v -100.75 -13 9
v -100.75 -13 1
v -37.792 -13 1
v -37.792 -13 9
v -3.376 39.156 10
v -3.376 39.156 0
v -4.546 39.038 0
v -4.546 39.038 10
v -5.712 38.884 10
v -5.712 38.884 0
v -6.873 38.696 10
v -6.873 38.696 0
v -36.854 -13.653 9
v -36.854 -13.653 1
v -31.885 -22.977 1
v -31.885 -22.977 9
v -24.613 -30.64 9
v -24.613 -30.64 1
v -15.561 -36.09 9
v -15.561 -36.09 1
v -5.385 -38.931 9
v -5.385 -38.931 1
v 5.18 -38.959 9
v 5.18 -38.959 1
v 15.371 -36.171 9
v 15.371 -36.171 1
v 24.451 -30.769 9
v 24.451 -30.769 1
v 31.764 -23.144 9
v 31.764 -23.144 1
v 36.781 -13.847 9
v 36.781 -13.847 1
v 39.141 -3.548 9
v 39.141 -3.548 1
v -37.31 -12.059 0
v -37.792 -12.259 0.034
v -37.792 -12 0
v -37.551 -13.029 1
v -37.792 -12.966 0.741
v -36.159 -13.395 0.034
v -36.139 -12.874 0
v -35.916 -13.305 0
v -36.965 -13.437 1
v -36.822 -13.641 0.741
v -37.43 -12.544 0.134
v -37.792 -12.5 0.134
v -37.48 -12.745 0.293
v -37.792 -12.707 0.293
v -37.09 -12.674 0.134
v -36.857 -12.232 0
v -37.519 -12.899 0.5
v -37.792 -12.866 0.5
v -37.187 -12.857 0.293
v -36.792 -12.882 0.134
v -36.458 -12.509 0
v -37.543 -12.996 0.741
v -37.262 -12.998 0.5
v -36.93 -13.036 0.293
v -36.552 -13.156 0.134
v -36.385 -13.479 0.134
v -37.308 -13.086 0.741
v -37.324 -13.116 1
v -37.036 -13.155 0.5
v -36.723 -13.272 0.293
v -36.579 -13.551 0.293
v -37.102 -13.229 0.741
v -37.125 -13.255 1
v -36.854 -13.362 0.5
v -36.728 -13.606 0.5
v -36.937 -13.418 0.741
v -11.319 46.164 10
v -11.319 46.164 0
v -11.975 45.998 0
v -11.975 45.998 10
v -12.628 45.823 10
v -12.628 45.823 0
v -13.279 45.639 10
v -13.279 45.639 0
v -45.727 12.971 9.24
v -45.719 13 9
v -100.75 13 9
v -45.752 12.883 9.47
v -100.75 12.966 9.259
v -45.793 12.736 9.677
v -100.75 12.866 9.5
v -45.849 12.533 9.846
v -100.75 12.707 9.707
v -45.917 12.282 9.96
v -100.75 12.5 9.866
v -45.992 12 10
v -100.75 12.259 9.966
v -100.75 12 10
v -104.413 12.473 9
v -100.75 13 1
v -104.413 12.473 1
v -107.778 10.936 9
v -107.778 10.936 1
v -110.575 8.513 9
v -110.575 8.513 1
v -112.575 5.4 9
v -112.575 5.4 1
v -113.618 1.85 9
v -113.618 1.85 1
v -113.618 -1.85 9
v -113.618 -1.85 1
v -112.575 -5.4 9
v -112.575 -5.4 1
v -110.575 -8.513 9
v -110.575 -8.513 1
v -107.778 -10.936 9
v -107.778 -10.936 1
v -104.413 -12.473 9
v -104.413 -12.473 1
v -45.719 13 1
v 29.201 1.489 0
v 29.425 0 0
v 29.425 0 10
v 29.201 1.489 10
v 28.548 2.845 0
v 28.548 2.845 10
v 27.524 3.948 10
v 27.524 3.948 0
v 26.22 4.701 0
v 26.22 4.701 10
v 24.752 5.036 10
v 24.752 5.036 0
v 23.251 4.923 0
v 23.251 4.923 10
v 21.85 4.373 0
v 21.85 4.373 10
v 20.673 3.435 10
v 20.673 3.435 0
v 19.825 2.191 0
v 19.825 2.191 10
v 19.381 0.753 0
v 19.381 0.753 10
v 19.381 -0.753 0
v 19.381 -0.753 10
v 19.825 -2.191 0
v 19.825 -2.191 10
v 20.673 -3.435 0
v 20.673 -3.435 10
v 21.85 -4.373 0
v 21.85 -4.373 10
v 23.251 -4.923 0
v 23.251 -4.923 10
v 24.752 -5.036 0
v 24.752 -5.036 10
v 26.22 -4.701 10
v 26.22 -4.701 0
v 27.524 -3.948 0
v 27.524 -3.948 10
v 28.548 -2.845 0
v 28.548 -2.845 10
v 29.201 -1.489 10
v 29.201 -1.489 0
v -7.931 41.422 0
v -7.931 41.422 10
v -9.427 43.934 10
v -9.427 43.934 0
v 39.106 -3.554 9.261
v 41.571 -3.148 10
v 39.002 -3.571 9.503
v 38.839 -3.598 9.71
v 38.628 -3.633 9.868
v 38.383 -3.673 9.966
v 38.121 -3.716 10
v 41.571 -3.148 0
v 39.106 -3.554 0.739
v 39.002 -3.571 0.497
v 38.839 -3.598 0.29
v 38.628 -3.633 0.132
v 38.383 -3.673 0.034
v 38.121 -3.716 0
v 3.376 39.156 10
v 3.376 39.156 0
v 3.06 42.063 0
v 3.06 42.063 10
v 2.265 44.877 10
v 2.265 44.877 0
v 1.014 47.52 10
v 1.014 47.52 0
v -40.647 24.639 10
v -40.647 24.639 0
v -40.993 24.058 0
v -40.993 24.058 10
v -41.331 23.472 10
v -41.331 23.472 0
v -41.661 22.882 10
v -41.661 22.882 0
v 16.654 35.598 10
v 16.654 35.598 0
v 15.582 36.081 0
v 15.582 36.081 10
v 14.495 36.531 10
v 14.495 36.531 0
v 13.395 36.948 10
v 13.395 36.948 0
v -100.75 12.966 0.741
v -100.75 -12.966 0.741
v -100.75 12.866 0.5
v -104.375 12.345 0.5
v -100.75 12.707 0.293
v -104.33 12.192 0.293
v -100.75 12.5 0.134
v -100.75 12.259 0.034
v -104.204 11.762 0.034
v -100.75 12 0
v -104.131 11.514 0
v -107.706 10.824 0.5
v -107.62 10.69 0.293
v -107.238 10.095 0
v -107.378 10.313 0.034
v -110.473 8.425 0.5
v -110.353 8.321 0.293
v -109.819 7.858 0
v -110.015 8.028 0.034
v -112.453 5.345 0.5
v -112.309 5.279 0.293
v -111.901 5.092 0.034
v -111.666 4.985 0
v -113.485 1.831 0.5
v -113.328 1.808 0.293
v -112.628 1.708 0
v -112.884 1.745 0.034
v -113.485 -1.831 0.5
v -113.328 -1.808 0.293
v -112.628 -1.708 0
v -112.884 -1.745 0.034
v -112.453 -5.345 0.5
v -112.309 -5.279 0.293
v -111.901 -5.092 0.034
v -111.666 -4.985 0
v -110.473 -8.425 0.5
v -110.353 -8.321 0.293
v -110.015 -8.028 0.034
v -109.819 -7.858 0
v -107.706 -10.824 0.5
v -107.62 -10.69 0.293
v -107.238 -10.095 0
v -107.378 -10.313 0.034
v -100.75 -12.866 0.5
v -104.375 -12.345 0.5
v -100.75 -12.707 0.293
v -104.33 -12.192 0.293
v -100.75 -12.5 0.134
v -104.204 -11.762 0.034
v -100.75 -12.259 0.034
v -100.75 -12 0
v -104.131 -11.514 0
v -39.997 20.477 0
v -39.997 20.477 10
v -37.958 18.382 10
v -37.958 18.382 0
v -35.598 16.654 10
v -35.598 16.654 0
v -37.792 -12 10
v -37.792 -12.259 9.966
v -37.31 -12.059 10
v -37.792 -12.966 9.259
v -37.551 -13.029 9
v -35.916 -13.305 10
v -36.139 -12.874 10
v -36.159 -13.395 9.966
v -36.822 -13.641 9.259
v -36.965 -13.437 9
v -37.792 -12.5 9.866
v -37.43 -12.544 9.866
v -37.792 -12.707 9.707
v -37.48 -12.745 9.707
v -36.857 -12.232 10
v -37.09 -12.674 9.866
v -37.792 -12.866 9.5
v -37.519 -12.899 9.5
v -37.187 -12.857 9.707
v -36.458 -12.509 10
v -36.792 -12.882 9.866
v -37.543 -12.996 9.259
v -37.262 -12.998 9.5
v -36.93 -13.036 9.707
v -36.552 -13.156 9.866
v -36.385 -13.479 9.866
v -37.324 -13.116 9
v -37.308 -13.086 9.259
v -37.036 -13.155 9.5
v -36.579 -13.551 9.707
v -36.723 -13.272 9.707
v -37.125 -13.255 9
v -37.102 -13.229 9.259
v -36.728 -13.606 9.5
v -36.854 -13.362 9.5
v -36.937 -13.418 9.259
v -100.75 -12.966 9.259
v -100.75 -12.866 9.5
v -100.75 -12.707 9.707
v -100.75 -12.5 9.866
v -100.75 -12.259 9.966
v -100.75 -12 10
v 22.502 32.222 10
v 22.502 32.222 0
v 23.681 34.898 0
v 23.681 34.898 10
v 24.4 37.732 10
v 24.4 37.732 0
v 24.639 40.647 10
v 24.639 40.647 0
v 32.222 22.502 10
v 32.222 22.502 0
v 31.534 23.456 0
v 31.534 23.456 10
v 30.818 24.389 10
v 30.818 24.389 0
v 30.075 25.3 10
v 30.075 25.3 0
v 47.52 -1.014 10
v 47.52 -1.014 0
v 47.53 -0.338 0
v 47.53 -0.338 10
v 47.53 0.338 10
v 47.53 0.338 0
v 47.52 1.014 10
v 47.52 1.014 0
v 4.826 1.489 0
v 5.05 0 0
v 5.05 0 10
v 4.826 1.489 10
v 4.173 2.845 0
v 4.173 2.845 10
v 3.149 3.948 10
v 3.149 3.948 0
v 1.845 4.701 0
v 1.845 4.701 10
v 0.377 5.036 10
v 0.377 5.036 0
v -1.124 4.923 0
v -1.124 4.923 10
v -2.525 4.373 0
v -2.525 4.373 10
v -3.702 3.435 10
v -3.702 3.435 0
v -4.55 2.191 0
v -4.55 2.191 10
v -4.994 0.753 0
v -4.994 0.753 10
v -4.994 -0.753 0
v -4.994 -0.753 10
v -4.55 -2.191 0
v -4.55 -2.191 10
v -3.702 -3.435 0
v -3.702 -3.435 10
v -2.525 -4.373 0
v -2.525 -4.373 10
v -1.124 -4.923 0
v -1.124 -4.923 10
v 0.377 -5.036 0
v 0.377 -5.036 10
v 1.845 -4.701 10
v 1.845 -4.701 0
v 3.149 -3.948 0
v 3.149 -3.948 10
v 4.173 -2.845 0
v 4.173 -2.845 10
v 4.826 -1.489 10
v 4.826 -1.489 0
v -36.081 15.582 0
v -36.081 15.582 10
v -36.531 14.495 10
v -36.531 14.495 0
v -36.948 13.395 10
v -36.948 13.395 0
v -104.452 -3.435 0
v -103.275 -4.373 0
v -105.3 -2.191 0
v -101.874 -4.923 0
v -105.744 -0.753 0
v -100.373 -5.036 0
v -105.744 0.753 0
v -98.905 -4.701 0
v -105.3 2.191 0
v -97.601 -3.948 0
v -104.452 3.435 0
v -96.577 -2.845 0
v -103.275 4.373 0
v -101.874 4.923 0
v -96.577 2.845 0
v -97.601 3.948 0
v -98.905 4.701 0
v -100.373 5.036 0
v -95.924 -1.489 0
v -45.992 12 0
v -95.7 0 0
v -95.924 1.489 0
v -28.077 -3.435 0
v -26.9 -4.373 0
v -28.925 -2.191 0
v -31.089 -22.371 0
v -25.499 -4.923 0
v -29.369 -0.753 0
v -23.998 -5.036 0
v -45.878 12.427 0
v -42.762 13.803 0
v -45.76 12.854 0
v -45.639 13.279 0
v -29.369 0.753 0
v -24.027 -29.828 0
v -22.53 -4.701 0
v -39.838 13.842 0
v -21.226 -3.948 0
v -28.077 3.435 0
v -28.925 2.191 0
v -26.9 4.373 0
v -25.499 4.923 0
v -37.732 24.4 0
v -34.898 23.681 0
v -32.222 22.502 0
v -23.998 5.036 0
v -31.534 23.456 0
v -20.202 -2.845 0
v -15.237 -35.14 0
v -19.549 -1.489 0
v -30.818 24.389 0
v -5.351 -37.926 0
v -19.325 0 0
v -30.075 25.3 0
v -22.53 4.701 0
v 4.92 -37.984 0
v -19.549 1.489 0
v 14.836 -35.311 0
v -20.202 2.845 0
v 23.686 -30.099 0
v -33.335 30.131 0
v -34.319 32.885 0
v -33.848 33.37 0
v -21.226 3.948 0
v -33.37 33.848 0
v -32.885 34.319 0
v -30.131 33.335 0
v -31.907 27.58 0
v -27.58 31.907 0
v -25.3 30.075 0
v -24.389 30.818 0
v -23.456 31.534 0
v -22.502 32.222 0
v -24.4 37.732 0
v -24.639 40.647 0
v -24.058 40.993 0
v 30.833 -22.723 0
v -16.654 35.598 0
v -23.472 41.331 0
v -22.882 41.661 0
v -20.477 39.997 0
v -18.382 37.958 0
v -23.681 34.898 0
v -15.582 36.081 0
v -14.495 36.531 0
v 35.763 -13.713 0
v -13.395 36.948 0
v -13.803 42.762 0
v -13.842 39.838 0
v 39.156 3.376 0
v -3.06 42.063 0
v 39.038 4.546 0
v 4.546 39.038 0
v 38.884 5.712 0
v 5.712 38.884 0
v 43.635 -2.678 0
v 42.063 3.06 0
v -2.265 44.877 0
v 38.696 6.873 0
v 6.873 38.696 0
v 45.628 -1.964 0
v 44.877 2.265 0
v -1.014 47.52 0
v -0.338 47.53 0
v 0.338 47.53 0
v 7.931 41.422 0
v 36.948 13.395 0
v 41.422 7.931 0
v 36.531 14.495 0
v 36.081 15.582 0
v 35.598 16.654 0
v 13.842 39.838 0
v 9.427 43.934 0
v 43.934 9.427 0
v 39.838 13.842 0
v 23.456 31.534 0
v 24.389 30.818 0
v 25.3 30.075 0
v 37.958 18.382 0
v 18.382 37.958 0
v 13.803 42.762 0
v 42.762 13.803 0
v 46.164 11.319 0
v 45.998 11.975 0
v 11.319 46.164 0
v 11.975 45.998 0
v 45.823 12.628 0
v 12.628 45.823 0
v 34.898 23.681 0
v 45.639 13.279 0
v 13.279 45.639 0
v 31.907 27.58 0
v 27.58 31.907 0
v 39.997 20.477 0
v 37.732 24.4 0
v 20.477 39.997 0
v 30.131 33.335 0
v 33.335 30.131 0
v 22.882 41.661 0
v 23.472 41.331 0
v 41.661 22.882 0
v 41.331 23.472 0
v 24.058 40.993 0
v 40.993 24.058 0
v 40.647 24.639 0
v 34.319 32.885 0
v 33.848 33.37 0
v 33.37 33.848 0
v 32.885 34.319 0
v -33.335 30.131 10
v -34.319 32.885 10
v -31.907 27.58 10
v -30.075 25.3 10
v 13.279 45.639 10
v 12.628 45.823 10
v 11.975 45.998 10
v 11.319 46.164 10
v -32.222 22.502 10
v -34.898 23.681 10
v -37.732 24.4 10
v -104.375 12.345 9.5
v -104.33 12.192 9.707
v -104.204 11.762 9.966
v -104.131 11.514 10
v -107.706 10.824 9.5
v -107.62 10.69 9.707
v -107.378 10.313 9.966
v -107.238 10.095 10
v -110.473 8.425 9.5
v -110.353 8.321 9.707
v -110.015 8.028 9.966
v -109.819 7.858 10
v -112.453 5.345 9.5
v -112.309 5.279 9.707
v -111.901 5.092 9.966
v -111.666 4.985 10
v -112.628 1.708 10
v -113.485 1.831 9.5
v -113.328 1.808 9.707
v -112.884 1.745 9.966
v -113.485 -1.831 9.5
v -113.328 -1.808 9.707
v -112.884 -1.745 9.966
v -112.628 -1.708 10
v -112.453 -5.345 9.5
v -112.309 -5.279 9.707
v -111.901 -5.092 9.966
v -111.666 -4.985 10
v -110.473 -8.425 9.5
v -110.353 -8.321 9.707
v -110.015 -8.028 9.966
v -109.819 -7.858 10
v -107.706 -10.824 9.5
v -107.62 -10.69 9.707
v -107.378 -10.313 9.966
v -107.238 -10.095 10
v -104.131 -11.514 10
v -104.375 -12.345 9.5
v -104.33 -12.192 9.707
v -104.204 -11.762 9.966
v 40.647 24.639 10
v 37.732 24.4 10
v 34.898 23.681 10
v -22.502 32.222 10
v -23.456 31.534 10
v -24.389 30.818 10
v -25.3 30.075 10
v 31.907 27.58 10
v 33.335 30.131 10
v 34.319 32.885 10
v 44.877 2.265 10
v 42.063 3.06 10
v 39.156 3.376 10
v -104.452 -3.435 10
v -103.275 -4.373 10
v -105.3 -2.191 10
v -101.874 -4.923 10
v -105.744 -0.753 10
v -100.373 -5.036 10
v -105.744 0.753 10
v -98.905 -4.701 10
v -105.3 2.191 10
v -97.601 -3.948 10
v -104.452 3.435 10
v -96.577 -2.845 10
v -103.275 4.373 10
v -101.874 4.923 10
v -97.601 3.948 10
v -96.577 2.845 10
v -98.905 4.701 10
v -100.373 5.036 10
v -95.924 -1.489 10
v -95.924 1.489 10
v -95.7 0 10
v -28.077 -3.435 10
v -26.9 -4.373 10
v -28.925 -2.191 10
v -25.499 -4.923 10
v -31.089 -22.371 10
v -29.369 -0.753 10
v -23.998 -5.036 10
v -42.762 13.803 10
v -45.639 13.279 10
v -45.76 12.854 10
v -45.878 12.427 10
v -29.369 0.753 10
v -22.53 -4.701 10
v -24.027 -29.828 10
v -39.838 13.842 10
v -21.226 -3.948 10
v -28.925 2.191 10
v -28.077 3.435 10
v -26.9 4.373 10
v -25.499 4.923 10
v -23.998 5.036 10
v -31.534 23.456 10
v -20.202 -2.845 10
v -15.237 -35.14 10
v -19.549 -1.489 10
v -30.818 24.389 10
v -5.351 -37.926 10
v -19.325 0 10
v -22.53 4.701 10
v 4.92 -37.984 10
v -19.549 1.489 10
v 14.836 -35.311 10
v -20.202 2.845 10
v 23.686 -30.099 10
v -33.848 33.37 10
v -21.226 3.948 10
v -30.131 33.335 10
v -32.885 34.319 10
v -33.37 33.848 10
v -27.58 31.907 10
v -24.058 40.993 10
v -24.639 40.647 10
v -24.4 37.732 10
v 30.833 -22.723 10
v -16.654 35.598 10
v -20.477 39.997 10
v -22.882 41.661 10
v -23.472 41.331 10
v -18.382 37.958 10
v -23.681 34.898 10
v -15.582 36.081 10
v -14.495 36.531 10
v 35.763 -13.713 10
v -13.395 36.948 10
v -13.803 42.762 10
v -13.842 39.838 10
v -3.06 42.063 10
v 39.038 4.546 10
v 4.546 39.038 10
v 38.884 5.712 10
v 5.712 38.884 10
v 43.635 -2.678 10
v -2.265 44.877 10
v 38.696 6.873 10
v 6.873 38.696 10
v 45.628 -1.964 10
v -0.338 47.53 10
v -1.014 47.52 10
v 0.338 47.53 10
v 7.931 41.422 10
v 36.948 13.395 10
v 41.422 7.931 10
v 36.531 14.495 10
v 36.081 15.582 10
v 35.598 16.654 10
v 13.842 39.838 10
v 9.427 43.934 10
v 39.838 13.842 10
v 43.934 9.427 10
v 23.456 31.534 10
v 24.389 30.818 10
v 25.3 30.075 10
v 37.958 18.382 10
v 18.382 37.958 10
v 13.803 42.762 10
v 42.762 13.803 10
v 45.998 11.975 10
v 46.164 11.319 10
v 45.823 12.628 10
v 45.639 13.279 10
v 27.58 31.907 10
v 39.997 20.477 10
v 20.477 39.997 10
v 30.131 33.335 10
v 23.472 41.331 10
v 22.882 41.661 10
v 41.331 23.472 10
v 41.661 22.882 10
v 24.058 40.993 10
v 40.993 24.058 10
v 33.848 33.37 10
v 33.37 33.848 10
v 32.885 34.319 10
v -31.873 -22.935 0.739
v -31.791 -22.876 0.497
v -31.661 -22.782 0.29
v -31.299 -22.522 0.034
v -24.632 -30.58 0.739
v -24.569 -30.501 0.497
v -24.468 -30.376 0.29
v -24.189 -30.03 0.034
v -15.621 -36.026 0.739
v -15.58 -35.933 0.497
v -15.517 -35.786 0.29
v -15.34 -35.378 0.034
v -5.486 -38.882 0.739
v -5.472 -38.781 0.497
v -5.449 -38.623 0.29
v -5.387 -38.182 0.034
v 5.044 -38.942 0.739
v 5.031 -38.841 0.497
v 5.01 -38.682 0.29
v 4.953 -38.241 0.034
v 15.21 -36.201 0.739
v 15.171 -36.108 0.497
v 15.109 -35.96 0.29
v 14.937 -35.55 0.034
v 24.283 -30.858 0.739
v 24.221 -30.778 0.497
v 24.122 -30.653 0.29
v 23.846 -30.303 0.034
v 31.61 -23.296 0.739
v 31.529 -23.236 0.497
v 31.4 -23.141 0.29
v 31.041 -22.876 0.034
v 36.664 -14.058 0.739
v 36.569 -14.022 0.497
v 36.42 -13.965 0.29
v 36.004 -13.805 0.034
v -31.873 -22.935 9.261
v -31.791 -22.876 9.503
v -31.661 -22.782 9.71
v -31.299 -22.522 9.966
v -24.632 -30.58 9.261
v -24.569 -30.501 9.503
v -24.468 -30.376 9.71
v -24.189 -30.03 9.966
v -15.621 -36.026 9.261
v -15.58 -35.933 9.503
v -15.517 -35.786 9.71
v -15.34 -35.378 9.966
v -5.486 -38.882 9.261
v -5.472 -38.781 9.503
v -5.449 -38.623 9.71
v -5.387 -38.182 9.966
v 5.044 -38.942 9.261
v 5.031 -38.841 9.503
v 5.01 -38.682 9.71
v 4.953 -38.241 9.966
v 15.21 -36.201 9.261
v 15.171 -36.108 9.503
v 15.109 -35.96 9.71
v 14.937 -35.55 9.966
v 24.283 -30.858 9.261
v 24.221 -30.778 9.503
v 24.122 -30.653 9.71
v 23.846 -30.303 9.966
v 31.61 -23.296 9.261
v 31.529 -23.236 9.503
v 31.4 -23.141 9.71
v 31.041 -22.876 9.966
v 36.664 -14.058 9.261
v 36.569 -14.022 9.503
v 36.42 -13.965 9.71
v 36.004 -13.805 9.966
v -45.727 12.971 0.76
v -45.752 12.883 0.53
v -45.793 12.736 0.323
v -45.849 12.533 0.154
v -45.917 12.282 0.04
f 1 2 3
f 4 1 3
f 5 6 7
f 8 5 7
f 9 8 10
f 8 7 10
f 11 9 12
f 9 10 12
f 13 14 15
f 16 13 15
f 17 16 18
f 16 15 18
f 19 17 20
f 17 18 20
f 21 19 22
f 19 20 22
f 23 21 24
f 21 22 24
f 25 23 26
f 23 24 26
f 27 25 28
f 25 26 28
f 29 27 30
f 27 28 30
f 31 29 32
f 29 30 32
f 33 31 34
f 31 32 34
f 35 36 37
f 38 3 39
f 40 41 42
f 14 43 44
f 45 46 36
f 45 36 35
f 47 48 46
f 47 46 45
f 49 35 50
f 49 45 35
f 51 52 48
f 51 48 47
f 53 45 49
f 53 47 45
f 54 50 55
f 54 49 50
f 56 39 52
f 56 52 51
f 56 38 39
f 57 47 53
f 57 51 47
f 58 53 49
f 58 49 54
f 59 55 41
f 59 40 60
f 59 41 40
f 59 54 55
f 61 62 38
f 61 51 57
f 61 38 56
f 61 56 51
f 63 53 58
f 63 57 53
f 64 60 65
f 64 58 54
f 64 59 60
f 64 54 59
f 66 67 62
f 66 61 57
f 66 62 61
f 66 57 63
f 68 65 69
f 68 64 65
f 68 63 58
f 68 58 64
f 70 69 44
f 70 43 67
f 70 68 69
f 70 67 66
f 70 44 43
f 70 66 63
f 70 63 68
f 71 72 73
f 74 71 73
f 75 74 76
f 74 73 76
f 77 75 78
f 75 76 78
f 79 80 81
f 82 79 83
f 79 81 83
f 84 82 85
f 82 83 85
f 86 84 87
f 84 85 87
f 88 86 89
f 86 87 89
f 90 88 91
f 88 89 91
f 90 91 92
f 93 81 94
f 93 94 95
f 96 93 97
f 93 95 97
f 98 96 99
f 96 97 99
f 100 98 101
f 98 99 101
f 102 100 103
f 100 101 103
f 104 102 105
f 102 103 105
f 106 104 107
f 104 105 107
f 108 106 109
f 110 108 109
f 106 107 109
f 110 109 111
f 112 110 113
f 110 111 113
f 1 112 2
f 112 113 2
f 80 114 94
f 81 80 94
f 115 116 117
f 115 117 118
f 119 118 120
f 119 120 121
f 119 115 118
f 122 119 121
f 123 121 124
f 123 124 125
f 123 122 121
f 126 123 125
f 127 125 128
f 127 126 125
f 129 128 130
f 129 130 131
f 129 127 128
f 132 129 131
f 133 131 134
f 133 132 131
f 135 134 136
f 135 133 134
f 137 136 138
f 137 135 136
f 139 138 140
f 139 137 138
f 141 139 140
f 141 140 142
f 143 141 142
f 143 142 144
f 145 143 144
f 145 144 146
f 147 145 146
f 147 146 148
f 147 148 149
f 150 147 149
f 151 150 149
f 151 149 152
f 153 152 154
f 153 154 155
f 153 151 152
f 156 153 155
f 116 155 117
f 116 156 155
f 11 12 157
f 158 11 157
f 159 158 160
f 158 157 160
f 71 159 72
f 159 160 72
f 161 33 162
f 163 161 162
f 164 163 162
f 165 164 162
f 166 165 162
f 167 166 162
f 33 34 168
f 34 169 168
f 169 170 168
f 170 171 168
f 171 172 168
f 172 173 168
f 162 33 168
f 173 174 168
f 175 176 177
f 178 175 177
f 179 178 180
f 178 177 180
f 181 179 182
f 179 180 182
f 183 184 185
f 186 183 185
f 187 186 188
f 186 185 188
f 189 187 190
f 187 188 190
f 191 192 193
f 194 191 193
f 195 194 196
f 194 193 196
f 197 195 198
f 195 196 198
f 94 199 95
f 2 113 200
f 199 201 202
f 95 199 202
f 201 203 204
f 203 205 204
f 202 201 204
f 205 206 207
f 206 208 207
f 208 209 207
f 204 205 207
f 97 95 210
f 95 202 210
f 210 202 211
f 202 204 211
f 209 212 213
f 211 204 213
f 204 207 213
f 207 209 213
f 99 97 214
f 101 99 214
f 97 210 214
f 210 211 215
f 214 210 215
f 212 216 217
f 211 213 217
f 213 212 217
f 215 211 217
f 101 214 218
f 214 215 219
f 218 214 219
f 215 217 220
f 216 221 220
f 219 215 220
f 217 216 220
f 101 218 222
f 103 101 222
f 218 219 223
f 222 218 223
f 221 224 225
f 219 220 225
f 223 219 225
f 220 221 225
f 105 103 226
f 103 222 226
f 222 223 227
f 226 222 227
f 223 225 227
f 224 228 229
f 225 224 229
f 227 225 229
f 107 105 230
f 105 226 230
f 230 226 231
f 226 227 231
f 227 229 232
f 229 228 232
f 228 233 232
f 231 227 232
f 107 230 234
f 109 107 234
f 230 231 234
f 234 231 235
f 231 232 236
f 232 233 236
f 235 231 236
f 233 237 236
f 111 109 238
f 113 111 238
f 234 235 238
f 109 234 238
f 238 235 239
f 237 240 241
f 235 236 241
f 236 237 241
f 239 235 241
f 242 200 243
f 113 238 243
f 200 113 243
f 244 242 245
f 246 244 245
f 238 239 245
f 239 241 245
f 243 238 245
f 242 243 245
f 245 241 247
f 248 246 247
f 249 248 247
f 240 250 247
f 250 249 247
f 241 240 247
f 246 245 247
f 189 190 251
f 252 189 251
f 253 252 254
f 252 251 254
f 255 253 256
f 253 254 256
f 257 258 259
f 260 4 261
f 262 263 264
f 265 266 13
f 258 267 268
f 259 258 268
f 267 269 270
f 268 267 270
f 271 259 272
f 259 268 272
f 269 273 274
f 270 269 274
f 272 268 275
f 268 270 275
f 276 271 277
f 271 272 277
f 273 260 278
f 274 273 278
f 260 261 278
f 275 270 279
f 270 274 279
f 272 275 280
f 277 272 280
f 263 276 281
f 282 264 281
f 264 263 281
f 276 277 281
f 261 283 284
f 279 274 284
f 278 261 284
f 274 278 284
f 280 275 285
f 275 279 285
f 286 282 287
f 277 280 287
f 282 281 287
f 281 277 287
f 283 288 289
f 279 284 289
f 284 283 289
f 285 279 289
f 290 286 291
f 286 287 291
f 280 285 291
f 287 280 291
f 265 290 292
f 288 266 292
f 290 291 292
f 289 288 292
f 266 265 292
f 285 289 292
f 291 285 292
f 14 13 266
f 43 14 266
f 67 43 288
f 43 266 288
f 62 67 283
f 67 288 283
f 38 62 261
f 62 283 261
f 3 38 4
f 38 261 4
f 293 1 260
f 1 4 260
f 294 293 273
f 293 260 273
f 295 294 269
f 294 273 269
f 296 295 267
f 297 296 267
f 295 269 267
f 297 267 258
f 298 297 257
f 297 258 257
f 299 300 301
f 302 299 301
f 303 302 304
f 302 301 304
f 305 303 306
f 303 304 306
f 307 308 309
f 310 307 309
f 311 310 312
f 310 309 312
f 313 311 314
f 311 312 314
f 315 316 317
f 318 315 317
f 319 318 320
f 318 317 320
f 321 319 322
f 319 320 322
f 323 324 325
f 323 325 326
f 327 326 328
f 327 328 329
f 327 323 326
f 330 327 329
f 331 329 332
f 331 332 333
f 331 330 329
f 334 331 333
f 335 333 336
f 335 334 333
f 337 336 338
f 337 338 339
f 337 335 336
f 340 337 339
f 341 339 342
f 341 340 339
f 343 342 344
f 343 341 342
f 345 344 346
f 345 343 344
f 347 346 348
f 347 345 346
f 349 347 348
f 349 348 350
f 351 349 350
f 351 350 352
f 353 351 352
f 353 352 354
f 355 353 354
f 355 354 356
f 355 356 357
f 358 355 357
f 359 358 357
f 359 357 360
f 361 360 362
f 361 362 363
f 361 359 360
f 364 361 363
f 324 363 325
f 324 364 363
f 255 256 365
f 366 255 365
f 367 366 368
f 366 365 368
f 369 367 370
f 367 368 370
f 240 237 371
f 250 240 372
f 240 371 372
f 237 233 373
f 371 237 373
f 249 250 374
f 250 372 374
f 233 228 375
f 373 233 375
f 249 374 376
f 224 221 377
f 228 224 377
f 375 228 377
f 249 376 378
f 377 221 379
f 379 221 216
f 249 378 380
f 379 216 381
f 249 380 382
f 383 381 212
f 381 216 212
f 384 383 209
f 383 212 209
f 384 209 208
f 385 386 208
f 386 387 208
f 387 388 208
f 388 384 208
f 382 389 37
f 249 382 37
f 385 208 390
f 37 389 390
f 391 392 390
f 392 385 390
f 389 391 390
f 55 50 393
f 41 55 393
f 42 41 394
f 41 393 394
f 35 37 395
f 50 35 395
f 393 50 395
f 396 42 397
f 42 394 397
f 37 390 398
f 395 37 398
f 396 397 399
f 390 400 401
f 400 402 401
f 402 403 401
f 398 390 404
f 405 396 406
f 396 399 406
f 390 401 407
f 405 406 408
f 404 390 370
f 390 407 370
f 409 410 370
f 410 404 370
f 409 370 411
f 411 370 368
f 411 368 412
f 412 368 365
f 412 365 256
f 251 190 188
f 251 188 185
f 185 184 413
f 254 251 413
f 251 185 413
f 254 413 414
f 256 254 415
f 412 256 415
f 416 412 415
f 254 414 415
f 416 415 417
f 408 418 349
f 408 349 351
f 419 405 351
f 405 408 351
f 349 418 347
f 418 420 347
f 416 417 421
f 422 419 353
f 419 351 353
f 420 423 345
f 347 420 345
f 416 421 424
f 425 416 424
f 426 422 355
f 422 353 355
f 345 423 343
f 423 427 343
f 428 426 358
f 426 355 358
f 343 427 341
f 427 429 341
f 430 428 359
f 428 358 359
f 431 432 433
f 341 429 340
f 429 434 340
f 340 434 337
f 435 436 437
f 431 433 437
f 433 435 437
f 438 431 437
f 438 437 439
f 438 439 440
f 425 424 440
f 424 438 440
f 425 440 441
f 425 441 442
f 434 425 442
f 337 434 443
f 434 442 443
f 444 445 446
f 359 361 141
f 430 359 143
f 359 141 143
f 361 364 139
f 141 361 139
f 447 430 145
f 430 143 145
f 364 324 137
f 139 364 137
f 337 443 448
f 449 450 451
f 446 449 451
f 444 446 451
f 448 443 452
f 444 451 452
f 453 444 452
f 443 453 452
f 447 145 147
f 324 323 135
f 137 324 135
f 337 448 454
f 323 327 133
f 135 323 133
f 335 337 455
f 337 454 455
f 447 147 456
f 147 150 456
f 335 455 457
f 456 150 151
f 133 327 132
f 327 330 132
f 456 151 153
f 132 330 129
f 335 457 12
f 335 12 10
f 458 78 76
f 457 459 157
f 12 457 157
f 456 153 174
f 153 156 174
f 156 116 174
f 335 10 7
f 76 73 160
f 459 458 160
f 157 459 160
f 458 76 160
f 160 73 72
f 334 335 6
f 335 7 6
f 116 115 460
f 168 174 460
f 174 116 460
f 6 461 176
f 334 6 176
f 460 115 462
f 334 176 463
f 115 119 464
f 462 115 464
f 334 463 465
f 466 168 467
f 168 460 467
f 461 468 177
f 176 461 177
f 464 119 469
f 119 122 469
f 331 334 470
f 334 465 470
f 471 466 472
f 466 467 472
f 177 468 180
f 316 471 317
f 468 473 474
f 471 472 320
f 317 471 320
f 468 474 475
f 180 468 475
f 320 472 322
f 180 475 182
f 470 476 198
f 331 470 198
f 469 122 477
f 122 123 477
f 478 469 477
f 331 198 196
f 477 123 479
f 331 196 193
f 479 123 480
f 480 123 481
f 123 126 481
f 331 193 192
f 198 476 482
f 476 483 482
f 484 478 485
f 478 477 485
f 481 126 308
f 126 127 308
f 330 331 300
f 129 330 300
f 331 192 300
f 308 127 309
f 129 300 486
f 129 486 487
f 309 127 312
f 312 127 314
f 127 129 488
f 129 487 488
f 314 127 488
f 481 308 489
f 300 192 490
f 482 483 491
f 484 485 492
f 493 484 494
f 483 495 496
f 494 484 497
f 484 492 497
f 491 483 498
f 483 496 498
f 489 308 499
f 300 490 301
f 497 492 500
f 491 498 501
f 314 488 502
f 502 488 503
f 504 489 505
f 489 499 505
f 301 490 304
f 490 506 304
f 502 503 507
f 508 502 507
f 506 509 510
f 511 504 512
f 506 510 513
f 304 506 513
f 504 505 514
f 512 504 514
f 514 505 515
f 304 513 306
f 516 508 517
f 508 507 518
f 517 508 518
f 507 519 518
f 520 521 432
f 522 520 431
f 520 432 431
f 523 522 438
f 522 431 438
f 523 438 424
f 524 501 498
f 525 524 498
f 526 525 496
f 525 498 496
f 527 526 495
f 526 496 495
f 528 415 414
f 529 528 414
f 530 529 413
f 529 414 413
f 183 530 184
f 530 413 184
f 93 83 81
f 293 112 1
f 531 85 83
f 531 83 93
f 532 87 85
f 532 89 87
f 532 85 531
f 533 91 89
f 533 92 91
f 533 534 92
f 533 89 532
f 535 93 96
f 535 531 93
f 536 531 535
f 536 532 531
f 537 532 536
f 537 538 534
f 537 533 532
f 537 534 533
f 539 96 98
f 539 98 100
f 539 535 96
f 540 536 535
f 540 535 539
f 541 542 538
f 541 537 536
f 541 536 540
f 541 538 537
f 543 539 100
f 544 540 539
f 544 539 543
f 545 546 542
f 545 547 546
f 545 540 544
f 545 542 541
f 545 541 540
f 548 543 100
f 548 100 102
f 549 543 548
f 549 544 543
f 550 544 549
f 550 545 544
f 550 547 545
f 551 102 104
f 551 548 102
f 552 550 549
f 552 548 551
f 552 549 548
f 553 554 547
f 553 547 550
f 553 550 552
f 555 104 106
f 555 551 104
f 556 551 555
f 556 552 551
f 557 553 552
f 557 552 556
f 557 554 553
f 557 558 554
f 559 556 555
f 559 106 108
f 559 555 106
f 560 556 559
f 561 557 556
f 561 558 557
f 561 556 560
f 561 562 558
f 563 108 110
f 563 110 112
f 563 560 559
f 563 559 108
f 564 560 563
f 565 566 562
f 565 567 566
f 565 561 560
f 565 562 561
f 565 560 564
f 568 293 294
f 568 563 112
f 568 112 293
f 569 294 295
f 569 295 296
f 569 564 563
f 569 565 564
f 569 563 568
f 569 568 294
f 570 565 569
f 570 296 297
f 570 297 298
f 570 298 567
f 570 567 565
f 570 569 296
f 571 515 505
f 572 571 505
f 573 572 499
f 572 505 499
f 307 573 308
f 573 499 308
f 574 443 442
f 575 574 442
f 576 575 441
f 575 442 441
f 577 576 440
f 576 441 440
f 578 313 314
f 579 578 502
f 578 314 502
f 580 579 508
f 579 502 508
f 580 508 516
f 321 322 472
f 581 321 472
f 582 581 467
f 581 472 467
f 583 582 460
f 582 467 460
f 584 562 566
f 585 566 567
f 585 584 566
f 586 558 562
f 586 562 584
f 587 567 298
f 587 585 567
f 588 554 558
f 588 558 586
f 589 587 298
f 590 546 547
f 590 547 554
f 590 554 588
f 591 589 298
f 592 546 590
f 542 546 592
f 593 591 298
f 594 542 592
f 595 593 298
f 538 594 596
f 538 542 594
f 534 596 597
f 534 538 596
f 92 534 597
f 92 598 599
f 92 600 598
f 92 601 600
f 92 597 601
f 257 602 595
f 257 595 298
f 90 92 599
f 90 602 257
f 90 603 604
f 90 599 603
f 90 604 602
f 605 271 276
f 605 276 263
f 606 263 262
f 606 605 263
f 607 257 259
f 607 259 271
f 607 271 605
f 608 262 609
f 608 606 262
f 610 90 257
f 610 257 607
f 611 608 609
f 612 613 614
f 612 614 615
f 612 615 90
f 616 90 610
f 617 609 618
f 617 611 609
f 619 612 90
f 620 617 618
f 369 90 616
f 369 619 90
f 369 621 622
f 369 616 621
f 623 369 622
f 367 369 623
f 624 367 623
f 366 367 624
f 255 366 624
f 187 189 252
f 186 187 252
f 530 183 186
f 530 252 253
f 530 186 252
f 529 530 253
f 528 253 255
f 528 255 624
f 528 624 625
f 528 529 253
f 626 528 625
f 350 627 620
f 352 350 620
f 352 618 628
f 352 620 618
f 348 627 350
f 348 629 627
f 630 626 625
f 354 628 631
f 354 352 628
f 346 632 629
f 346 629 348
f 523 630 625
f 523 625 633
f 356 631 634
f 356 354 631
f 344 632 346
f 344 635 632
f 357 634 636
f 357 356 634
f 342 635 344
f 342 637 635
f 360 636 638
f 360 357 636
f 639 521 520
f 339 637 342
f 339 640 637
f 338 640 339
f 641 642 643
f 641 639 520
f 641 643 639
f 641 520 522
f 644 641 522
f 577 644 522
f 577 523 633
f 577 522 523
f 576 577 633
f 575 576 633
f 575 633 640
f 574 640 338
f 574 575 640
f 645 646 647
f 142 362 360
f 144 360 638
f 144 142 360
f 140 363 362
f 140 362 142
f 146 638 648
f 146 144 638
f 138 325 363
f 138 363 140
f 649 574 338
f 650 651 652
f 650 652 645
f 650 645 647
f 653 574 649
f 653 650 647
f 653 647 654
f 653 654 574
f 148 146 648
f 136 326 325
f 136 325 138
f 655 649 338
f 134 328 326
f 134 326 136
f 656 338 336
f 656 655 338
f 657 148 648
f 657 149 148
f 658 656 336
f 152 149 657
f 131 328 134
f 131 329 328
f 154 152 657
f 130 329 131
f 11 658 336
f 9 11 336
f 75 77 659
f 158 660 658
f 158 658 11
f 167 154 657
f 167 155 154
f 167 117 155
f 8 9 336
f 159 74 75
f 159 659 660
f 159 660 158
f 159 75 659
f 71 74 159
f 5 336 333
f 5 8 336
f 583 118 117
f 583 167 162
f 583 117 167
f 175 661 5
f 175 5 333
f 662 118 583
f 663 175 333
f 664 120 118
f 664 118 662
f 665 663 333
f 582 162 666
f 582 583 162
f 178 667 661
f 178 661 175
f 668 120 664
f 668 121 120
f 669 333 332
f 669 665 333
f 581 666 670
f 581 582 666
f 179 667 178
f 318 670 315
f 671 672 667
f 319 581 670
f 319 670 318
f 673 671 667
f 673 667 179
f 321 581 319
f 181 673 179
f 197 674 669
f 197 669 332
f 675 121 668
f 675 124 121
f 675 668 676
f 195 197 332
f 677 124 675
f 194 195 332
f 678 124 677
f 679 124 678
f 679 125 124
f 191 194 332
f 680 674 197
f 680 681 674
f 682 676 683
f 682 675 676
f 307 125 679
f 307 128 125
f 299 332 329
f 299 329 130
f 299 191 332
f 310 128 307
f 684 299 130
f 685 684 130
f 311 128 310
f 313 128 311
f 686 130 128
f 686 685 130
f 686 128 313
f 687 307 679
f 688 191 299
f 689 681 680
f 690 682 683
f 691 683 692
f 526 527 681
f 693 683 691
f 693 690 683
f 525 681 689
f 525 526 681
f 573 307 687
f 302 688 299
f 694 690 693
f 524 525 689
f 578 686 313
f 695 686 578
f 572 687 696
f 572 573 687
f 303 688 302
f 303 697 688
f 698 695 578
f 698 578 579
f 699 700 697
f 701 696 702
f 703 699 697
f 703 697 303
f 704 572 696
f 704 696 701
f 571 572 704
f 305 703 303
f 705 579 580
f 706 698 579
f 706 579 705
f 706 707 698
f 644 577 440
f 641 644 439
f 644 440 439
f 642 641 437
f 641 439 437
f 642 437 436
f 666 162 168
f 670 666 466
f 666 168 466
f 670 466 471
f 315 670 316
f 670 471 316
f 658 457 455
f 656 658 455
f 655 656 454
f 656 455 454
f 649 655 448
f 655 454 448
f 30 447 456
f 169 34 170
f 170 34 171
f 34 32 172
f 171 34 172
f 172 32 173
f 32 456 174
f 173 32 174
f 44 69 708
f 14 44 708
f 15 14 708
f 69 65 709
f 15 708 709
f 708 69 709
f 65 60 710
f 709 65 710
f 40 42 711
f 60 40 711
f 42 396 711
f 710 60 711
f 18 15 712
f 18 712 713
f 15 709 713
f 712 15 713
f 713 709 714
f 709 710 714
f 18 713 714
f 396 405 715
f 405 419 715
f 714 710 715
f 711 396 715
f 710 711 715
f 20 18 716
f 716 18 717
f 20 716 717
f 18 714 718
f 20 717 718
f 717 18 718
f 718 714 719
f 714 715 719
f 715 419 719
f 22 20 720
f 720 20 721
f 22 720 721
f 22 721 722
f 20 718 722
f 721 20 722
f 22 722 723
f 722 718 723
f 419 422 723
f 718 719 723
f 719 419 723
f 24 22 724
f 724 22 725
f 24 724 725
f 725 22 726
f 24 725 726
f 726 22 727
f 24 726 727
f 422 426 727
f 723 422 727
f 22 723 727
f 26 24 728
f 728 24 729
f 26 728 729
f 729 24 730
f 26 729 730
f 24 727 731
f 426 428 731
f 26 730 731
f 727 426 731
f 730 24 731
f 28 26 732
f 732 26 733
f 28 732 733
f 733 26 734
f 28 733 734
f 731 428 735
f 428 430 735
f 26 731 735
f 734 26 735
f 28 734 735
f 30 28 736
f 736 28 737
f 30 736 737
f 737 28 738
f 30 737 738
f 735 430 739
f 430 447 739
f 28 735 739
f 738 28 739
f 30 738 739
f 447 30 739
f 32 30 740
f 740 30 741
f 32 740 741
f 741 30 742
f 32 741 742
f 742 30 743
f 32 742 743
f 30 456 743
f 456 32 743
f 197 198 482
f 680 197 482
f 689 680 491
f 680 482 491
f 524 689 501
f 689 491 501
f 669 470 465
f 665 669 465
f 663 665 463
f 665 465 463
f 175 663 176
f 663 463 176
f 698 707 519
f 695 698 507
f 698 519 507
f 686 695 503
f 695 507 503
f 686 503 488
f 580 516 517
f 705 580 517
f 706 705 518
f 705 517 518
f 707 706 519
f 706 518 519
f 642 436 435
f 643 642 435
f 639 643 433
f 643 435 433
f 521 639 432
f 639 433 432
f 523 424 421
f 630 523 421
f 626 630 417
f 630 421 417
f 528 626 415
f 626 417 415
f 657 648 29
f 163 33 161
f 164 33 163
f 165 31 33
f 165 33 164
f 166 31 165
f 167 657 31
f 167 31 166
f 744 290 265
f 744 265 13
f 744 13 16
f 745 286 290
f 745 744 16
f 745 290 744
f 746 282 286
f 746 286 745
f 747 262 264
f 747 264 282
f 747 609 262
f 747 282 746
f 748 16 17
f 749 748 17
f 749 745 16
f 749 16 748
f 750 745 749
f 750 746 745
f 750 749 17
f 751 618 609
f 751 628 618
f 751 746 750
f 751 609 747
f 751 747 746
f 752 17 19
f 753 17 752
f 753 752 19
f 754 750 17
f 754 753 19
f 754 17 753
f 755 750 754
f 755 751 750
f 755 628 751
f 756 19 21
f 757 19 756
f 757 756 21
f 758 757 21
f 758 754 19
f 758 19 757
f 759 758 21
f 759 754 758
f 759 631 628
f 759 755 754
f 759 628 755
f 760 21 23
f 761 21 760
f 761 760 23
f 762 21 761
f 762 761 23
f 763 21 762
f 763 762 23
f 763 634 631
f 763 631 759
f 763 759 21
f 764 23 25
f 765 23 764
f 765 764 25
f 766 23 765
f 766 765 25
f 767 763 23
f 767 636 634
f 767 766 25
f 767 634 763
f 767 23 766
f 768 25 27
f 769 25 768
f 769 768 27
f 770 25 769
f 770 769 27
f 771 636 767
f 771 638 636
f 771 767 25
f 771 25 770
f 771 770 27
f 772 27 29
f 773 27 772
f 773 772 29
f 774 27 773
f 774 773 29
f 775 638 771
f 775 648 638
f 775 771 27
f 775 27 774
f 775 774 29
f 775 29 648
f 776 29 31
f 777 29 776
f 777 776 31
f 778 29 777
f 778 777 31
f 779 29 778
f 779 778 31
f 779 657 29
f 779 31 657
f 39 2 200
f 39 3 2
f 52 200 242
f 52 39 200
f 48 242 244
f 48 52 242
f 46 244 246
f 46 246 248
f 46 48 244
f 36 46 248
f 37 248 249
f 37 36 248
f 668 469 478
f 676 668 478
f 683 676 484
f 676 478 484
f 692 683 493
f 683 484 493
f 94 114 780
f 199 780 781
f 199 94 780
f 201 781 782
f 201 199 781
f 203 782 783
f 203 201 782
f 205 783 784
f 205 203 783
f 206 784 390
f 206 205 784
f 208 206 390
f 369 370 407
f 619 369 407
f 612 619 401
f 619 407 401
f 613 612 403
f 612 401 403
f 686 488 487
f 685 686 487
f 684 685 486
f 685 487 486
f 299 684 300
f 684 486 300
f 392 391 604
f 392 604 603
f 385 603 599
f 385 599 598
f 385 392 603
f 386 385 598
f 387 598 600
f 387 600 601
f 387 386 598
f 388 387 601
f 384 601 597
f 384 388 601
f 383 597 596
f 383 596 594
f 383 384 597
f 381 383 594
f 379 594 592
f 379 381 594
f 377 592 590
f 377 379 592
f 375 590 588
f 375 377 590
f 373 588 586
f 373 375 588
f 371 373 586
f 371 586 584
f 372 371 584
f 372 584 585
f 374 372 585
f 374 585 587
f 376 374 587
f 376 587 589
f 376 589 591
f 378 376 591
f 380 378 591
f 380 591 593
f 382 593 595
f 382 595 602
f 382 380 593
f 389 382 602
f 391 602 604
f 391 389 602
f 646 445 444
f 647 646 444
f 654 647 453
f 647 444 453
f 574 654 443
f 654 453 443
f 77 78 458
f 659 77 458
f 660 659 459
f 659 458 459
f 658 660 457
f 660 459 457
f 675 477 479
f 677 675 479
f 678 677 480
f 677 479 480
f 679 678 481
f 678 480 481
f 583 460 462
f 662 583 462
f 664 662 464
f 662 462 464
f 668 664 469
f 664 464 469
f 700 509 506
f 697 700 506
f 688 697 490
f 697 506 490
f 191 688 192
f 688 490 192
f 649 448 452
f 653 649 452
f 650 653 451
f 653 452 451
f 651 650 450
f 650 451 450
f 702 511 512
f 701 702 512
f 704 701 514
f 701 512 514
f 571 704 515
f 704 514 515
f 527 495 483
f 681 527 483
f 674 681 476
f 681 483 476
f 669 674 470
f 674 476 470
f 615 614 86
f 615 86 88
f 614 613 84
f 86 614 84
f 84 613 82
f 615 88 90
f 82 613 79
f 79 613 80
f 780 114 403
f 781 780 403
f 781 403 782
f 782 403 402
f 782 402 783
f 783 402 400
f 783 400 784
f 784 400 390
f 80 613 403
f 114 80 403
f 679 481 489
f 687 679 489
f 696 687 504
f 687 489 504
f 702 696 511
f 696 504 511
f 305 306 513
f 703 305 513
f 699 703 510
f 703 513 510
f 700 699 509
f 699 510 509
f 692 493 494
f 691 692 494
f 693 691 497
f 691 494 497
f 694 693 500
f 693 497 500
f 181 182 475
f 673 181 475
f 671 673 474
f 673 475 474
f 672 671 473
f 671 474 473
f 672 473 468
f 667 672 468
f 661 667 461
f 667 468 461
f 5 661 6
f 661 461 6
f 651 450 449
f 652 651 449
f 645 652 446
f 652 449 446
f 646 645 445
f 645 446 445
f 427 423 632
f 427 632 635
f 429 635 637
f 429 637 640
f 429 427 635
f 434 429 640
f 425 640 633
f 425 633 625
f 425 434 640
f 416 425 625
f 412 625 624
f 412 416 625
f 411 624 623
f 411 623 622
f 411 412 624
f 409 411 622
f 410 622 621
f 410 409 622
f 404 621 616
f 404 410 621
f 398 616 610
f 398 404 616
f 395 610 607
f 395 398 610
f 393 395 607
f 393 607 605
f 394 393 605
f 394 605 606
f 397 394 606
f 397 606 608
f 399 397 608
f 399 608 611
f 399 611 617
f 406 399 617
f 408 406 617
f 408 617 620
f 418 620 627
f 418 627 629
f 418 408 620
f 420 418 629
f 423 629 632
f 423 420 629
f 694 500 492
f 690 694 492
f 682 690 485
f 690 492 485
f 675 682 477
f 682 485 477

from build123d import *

# Parameters (mm, degrees)
SKETCH_1_R      = 5.05
EXTRUDE_1_DEPTH = 10
FILLET_1_R      = 1


with BuildPart() as part:
    # 草图1 → 凸台-拉伸1 (new body)
    with BuildSketch(Plane.XY):
        with BuildLine():
            Line((39.140934276, -3.548274735), (41.570630213, -3.148020227))
            ThreePointArc((41.570630213, -3.148020227), (44.642381358, -2.351220065), (47.520426727, -1.0142831))
            ThreePointArc((47.520426727, -1.0142831), (47.53125, 0), (47.520426727, 1.0142831))
            ThreePointArc((47.520426727, 1.0142831), (43.486808197, 2.721078851), (39.156174689, 3.375940359))
            ThreePointArc((39.156174689, 3.375940359), (38.965208254, 5.129866986), (38.695718051, 6.873455762))
            ThreePointArc((38.695718051, 6.873455762), (42.709298171, 8.626853835), (46.163723236, 11.319469227))
            ThreePointArc((46.163723236, 11.319469227), (45.911661931, 12.301992738), (45.638691669, 13.27891371))
            ThreePointArc((45.638691669, 13.27891371), (41.300764111, 13.88357451), (36.948202731, 13.395271723))
            ThreePointArc((36.948202731, 13.395271723), (36.309793705, 15.040008999), (35.598212175, 16.654437232))
            ThreePointArc((35.598212175, 16.654437232), (39.021220054, 19.386880688), (41.661038295, 22.881818432))
            ThreePointArc((41.661038295, 22.881818432), (41.163269974, 23.765625), (40.646755194, 24.638608295))
            ThreePointArc((40.646755194, 24.638608295), (36.300141203, 24.09992751), (32.222271816, 22.501737457))
            ThreePointArc((32.222271816, 22.501737457), (31.179926719, 23.925199255), (30.074746968, 25.300446327))
            ThreePointArc((30.074746968, 25.300446327), (32.673910276, 28.825723661), (34.319222442, 32.884809526))
            ThreePointArc((34.319222442, 32.884809526), (33.609669193, 33.609669193), (32.884809526, 34.319222442))
            ThreePointArc((32.884809526, 34.319222442), (28.825723661, 32.673910276), (25.300446327, 30.074746968))
            ThreePointArc((25.300446327, 30.074746968), (23.925199255, 31.179926719), (22.501737457, 32.222271816))
            ThreePointArc((22.501737457, 32.222271816), (24.09992751, 36.300141203), (24.638608295, 40.646755194))
            ThreePointArc((24.638608295, 40.646755194), (23.765625, 41.163269974), (22.881818432, 41.661038295))
            ThreePointArc((22.881818432, 41.661038295), (19.386880688, 39.021220054), (16.654437232, 35.598212175))
            ThreePointArc((16.654437232, 35.598212175), (15.040008999, 36.309793705), (13.395271723, 36.948202731))
            ThreePointArc((13.395271723, 36.948202731), (13.88357451, 41.300764111), (13.27891371, 45.638691669))
            ThreePointArc((13.27891371, 45.638691669), (12.301992738, 45.911661931), (11.319469227, 46.163723236))
            ThreePointArc((11.319469227, 46.163723236), (8.626853835, 42.709298171), (6.873455762, 38.695718051))
            ThreePointArc((6.873455762, 38.695718051), (5.129866986, 38.965208254), (3.375940359, 39.156174689))
            ThreePointArc((3.375940359, 39.156174689), (2.721078851, 43.486808197), (1.0142831, 47.520426727))
            ThreePointArc((1.0142831, 47.520426727), (0, 47.53125), (-1.0142831, 47.520426727))
            ThreePointArc((-1.0142831, 47.520426727), (-2.721078851, 43.486808197), (-3.375940359, 39.156174689))
            ThreePointArc((-3.375940359, 39.156174689), (-5.129866986, 38.965208254), (-6.873455762, 38.695718051))
            ThreePointArc((-6.873455762, 38.695718051), (-8.626853835, 42.709298171), (-11.319469227, 46.163723236))
            ThreePointArc((-11.319469227, 46.163723236), (-12.301992738, 45.911661931), (-13.27891371, 45.638691669))
            ThreePointArc((-13.27891371, 45.638691669), (-13.88357451, 41.300764111), (-13.395271723, 36.948202731))
            ThreePointArc((-13.395271723, 36.948202731), (-15.040008999, 36.309793705), (-16.654437232, 35.598212175))
            ThreePointArc((-16.654437232, 35.598212175), (-19.386880688, 39.021220054), (-22.881818432, 41.661038295))
            ThreePointArc((-22.881818432, 41.661038295), (-23.765625, 41.163269974), (-24.638608295, 40.646755194))
            ThreePointArc((-24.638608295, 40.646755194), (-24.09992751, 36.300141203), (-22.501737457, 32.222271816))
            ThreePointArc((-22.501737457, 32.222271816), (-23.925199255, 31.179926719), (-25.300446327, 30.074746968))
            ThreePointArc((-25.300446327, 30.074746968), (-28.825723661, 32.673910276), (-32.884809526, 34.319222442))
            ThreePointArc((-32.884809526, 34.319222442), (-33.609669193, 33.609669193), (-34.319222442, 32.884809526))
            ThreePointArc((-34.319222442, 32.884809526), (-32.673910276, 28.825723661), (-30.074746968, 25.300446327))
            ThreePointArc((-30.074746968, 25.300446327), (-31.179926719, 23.925199255), (-32.222271816, 22.501737457))
            ThreePointArc((-32.222271816, 22.501737457), (-36.300141203, 24.09992751), (-40.646755194, 24.638608295))
            ThreePointArc((-40.646755194, 24.638608295), (-41.163269974, 23.765625), (-41.661038295, 22.881818432))
            ThreePointArc((-41.661038295, 22.881818432), (-39.021220054, 19.386880688), (-35.598212175, 16.654437232))
            ThreePointArc((-35.598212175, 16.654437232), (-36.309793705, 15.040008999), (-36.948202731, 13.395271723))
            ThreePointArc((-36.948202731, 13.395271723), (-41.300764111, 13.88357451), (-45.638691669, 13.27891371))
            ThreePointArc((-45.638691669, 13.27891371), (-45.679019155, 13.13951809), (-45.718920881, 13))
            Line((-45.718920881, 13), (-100.75, 13))
            ThreePointArc((-100.75, 13), (-113.75, 0), (-100.75, -13))
            Line((-100.75, -13), (-37.089122254, -13))
            ThreePointArc((-37.089122254, -13), (4.835934322, -39.002778475), (39.140934276, -3.548274735))
        make_face()
        with Locations((24.375, 0)):
            Circle(SKETCH_1_R, mode=Mode.SUBTRACT)
        Circle(SKETCH_1_R, mode=Mode.SUBTRACT)
        with Locations((-24.375, 0)):
            Circle(SKETCH_1_R, mode=Mode.SUBTRACT)
        with Locations((-100.75, 0)):
            Circle(SKETCH_1_R, mode=Mode.SUBTRACT)
    extrude(amount=EXTRUDE_1_DEPTH)

    # 圆角1
    fillet_1_edges = [part.edges().sort_by_distance(p)[0] for p in [
        (-73.234460441, 13, 10),
        (-113.75, 0, 10),
        (-68.919561127, -13, 10),
        (-68.919561127, -13, 0),
        (-113.75, 0, 0),
        (-73.234460441, 13, 0),
        (4.835934322, -39.002778475, 10),
        (4.835934322, -39.002778475, 0),
        (-37.089122254, -13, 5),
    ]]
    fillet(fillet_1_edges, radius=FILLET_1_R)


solid = part.part
